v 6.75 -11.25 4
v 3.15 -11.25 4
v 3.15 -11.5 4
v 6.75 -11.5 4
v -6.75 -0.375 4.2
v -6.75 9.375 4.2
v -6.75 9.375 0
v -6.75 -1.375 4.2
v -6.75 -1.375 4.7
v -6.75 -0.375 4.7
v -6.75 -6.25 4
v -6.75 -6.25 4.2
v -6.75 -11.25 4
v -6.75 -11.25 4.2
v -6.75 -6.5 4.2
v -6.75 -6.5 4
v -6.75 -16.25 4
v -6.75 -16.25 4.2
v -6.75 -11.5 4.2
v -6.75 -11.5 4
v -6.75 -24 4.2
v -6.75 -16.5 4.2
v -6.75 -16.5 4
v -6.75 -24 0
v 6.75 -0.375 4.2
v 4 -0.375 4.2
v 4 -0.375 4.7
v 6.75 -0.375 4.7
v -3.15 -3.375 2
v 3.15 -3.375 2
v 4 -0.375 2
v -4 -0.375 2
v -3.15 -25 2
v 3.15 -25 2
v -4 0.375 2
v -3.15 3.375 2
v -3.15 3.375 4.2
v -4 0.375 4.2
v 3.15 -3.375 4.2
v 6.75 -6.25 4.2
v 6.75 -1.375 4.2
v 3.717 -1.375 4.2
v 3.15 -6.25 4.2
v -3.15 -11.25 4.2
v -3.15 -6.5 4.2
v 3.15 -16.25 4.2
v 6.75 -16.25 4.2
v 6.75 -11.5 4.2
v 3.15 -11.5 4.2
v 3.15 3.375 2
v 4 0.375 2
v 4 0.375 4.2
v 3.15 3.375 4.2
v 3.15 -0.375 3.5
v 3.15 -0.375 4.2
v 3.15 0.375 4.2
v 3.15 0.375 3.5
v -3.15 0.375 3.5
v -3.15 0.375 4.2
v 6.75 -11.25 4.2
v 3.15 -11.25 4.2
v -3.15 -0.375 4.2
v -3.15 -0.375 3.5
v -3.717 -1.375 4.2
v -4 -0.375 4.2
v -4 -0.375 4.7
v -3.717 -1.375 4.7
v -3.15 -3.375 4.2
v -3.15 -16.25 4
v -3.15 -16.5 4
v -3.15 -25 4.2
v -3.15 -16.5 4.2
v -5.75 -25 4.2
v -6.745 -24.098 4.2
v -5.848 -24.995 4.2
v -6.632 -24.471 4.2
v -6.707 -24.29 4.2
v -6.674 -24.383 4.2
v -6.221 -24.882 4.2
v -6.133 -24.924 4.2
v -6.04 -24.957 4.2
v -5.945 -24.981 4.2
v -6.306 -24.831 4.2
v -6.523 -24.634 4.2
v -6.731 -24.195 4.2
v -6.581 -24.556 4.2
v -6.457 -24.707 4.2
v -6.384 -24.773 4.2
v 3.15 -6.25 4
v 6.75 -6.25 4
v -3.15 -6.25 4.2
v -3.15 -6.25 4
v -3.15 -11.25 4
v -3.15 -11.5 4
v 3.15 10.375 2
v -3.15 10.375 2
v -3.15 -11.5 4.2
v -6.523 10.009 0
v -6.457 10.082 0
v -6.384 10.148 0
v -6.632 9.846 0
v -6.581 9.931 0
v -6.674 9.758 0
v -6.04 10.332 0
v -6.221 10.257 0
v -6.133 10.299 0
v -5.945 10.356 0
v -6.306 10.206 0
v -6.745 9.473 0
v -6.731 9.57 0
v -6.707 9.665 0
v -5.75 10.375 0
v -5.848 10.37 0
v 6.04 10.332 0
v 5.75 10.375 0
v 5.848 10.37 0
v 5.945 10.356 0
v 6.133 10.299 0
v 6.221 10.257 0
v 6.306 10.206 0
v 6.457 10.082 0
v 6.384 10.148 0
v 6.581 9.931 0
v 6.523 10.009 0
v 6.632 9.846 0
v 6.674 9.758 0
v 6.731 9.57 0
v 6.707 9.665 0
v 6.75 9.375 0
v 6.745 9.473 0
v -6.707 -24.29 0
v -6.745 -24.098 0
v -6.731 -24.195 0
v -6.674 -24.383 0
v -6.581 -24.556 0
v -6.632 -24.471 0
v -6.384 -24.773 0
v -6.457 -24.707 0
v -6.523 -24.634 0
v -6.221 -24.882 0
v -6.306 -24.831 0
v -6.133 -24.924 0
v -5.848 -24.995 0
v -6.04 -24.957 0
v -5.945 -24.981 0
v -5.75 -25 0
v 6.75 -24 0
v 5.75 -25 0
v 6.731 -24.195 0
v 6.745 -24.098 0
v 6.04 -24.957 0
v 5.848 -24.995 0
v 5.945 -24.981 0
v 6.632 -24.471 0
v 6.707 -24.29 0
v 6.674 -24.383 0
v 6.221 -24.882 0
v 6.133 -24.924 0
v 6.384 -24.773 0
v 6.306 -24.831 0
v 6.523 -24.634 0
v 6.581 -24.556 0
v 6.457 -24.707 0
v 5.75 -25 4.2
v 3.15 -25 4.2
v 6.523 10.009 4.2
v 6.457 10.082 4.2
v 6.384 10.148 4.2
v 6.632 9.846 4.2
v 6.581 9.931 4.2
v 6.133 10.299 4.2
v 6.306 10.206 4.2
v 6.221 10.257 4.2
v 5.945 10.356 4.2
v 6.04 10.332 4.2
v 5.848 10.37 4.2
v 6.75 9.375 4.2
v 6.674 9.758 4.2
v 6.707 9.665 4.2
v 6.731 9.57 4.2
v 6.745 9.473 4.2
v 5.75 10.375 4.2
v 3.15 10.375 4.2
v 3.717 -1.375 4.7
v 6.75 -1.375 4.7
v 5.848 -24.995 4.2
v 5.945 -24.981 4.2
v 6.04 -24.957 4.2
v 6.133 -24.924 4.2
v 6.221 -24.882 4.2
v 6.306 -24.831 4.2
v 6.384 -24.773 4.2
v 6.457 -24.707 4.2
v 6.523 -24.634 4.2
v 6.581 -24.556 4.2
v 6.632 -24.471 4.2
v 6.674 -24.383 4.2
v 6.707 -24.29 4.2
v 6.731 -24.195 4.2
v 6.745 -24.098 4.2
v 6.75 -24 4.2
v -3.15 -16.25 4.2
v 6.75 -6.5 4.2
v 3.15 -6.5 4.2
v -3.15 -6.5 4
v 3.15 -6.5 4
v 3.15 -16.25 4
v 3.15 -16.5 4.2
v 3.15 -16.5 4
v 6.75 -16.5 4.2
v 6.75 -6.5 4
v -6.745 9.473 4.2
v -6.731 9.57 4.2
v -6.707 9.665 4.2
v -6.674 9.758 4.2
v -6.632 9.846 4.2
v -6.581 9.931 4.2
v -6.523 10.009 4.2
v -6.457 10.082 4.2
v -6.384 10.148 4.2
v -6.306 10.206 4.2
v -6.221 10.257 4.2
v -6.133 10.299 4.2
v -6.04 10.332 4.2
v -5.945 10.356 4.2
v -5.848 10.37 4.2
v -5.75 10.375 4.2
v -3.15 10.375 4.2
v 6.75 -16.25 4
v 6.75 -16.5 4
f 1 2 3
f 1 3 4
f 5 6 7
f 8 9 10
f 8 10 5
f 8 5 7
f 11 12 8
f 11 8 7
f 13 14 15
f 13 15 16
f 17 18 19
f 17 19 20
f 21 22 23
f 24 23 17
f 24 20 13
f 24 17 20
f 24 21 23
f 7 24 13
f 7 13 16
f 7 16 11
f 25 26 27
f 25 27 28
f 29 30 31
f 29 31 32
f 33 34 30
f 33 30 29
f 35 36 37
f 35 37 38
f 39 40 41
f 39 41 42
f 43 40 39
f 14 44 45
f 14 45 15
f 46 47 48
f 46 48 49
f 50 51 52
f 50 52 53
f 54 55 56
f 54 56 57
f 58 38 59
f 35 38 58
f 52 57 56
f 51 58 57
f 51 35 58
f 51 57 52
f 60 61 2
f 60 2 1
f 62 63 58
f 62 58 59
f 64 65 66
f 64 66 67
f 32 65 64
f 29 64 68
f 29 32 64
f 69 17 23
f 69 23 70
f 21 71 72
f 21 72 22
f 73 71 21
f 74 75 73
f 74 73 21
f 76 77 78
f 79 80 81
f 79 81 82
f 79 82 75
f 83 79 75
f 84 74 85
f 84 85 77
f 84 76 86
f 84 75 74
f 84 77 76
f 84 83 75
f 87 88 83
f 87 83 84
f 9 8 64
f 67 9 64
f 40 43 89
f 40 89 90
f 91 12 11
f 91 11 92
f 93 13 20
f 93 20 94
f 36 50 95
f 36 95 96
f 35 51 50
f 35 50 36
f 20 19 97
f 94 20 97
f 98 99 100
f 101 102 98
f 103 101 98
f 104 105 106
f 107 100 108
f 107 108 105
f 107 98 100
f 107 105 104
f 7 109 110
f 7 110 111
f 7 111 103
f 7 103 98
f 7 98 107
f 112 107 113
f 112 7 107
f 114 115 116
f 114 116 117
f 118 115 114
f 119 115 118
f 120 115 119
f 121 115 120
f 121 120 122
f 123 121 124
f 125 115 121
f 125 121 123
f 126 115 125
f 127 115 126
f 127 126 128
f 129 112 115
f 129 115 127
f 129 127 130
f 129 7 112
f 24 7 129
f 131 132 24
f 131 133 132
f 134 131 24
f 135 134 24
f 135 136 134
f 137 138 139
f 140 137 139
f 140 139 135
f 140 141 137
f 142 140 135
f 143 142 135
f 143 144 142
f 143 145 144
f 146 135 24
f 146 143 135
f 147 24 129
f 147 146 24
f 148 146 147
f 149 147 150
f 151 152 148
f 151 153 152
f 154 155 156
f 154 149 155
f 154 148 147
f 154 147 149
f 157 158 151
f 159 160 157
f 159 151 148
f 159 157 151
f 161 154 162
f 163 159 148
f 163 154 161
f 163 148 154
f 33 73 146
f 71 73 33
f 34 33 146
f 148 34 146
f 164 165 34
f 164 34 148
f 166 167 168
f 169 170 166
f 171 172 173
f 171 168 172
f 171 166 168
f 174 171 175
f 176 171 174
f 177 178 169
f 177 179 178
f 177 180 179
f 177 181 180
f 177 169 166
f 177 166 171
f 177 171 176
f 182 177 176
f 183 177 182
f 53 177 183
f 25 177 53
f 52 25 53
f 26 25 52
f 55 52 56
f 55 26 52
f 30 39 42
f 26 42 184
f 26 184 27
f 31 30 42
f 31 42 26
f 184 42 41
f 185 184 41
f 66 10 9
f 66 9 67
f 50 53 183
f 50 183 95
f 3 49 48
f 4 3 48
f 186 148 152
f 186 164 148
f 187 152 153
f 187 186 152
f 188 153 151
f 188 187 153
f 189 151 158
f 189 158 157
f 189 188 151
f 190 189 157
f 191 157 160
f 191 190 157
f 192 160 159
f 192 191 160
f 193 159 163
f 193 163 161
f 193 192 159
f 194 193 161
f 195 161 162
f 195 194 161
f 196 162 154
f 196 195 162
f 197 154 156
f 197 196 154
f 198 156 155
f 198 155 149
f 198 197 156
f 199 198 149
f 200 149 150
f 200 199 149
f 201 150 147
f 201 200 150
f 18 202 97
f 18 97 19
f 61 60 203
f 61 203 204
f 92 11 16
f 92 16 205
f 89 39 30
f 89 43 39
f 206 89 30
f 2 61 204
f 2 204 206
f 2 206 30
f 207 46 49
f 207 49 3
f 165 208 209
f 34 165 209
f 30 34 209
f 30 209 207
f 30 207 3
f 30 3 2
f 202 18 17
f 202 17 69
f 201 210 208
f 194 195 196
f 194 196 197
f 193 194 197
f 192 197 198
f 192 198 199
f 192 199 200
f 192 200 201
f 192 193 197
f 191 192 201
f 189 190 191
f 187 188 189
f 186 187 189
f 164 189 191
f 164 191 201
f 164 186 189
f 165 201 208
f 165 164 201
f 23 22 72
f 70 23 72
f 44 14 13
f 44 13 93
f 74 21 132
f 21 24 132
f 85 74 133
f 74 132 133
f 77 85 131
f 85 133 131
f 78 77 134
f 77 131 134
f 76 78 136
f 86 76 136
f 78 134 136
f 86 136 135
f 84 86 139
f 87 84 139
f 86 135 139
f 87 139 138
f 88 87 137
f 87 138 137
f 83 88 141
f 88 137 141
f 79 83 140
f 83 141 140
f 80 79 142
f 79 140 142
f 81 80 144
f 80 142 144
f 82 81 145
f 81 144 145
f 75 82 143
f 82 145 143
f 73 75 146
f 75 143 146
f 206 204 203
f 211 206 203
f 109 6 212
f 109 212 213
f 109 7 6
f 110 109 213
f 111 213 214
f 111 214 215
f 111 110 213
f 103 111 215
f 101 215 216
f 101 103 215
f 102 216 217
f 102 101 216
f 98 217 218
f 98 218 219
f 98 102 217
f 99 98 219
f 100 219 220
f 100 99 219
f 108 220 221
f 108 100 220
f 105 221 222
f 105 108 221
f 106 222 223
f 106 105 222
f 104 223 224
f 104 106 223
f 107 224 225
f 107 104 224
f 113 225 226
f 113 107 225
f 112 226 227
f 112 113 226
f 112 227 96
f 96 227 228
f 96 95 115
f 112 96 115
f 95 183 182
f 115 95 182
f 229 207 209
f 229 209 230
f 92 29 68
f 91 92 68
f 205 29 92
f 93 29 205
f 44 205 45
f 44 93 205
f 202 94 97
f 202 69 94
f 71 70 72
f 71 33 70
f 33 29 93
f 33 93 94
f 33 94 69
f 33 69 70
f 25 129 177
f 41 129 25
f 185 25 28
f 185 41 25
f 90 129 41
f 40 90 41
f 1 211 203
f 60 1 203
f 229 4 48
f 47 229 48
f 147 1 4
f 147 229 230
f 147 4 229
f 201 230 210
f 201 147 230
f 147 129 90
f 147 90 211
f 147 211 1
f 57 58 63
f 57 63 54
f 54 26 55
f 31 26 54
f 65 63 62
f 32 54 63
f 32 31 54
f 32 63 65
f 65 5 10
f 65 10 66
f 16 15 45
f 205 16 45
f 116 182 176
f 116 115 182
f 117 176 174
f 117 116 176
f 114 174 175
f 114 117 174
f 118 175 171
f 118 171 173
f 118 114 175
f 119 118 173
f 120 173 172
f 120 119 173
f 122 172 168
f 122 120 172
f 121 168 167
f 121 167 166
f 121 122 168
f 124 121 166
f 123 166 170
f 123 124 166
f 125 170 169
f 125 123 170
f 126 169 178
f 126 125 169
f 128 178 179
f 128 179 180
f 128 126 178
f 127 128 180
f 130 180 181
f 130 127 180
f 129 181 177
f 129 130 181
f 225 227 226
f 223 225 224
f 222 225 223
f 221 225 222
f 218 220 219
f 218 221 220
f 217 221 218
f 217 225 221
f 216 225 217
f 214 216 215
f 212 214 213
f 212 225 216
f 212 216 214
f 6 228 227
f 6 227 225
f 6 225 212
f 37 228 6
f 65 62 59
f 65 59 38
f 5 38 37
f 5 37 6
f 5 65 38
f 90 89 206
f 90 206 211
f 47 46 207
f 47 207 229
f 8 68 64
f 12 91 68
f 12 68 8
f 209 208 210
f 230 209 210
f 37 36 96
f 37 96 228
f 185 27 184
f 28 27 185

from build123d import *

# Parameters (mm, degrees)
F1_DEPTH  = 25
F2_W      = 6.3
F2_H      = 0.75
F3_DEPTH  = 1.5
F4_W      = 3.6
F4_H      = 1
F5_DEPTH  = 0.5
F6_W      = 13.5
F6_H      = 0.25
F7_DEPTH  = 0.2
F8_W      = 13.5
F8_H      = 14.625
F9_DEPTH  = 4.201
F10_R     = 1
F12_DEPTH = 2.701


with BuildPart() as f1:
    # F0 (on Front) → F1 (new body, symmetric)
    with BuildSketch(Plane.XZ):
        Polygon((-6.75, 4.2), (-6.75, 0), (6.75, 0), (6.75, 4.2), (3.15, 4.2), (3.15, 2), (-3.15, 2), (-3.15, 4.2), align=None)
    extrude(amount=F1_DEPTH, both=True)

    # F2 (on face) → F3 (join)
    with BuildSketch(Plane.XY.offset(2)):
        Rectangle(F2_W, F2_H)
    extrude(amount=F3_DEPTH)

    # F4 (on face) → F5 (join)
    with BuildSketch(Plane.XY.offset(4.2)):
        with Locations((4.95, -0.875)):
            Rectangle(F4_W, F4_H)
        with Locations((-4.95, -0.875)):
            Rectangle(F4_W, F4_H)
    extrude(amount=F5_DEPTH)

    # F6 (on face) → F7 (cut)
    with BuildSketch(Plane.XY.offset(4.2)):
        with Locations((0, -6.375)):
            Rectangle(F6_W, F6_H)
        with Locations((0, -11.375)):
            Rectangle(F6_W, F6_H)
        with Locations((0, -16.375)):
            Rectangle(F6_W, F6_H)
    extrude(amount=-F7_DEPTH, mode=Mode.SUBTRACT)

    # F8 (on face) → F9 (cut, through all)
    with BuildSketch(Plane.XY.offset(4.2)):
        with Locations((0, 17.6875)):
            Rectangle(F8_W, F8_H)
    extrude(amount=-F9_DEPTH, mode=Mode.SUBTRACT)

    # F10
    f10_edges = [f1.edges().sort_by_distance(p)[0] for p in [
        (-6.75, 10.375, 2.1),
        (6.75, 10.375, 2.1),
        (-6.75, -25, 2.1),
        (6.75, -25, 2.1),
    ]]
    fillet(f10_edges, radius=F10_R)

    # F11 (on face) → F12 (cut, through all)
    with BuildSketch(Plane.XY.offset(2)):
        Polygon((4, -0.375), (-4, -0.375), (-3.15, -3.375), (3.15, -3.375), align=None)
        Polygon((-3.15, 3.375), (-4, 0.375), (4, 0.375), (3.15, 3.375), align=None)
    extrude(amount=F12_DEPTH, mode=Mode.SUBTRACT)


solid = f1.part
